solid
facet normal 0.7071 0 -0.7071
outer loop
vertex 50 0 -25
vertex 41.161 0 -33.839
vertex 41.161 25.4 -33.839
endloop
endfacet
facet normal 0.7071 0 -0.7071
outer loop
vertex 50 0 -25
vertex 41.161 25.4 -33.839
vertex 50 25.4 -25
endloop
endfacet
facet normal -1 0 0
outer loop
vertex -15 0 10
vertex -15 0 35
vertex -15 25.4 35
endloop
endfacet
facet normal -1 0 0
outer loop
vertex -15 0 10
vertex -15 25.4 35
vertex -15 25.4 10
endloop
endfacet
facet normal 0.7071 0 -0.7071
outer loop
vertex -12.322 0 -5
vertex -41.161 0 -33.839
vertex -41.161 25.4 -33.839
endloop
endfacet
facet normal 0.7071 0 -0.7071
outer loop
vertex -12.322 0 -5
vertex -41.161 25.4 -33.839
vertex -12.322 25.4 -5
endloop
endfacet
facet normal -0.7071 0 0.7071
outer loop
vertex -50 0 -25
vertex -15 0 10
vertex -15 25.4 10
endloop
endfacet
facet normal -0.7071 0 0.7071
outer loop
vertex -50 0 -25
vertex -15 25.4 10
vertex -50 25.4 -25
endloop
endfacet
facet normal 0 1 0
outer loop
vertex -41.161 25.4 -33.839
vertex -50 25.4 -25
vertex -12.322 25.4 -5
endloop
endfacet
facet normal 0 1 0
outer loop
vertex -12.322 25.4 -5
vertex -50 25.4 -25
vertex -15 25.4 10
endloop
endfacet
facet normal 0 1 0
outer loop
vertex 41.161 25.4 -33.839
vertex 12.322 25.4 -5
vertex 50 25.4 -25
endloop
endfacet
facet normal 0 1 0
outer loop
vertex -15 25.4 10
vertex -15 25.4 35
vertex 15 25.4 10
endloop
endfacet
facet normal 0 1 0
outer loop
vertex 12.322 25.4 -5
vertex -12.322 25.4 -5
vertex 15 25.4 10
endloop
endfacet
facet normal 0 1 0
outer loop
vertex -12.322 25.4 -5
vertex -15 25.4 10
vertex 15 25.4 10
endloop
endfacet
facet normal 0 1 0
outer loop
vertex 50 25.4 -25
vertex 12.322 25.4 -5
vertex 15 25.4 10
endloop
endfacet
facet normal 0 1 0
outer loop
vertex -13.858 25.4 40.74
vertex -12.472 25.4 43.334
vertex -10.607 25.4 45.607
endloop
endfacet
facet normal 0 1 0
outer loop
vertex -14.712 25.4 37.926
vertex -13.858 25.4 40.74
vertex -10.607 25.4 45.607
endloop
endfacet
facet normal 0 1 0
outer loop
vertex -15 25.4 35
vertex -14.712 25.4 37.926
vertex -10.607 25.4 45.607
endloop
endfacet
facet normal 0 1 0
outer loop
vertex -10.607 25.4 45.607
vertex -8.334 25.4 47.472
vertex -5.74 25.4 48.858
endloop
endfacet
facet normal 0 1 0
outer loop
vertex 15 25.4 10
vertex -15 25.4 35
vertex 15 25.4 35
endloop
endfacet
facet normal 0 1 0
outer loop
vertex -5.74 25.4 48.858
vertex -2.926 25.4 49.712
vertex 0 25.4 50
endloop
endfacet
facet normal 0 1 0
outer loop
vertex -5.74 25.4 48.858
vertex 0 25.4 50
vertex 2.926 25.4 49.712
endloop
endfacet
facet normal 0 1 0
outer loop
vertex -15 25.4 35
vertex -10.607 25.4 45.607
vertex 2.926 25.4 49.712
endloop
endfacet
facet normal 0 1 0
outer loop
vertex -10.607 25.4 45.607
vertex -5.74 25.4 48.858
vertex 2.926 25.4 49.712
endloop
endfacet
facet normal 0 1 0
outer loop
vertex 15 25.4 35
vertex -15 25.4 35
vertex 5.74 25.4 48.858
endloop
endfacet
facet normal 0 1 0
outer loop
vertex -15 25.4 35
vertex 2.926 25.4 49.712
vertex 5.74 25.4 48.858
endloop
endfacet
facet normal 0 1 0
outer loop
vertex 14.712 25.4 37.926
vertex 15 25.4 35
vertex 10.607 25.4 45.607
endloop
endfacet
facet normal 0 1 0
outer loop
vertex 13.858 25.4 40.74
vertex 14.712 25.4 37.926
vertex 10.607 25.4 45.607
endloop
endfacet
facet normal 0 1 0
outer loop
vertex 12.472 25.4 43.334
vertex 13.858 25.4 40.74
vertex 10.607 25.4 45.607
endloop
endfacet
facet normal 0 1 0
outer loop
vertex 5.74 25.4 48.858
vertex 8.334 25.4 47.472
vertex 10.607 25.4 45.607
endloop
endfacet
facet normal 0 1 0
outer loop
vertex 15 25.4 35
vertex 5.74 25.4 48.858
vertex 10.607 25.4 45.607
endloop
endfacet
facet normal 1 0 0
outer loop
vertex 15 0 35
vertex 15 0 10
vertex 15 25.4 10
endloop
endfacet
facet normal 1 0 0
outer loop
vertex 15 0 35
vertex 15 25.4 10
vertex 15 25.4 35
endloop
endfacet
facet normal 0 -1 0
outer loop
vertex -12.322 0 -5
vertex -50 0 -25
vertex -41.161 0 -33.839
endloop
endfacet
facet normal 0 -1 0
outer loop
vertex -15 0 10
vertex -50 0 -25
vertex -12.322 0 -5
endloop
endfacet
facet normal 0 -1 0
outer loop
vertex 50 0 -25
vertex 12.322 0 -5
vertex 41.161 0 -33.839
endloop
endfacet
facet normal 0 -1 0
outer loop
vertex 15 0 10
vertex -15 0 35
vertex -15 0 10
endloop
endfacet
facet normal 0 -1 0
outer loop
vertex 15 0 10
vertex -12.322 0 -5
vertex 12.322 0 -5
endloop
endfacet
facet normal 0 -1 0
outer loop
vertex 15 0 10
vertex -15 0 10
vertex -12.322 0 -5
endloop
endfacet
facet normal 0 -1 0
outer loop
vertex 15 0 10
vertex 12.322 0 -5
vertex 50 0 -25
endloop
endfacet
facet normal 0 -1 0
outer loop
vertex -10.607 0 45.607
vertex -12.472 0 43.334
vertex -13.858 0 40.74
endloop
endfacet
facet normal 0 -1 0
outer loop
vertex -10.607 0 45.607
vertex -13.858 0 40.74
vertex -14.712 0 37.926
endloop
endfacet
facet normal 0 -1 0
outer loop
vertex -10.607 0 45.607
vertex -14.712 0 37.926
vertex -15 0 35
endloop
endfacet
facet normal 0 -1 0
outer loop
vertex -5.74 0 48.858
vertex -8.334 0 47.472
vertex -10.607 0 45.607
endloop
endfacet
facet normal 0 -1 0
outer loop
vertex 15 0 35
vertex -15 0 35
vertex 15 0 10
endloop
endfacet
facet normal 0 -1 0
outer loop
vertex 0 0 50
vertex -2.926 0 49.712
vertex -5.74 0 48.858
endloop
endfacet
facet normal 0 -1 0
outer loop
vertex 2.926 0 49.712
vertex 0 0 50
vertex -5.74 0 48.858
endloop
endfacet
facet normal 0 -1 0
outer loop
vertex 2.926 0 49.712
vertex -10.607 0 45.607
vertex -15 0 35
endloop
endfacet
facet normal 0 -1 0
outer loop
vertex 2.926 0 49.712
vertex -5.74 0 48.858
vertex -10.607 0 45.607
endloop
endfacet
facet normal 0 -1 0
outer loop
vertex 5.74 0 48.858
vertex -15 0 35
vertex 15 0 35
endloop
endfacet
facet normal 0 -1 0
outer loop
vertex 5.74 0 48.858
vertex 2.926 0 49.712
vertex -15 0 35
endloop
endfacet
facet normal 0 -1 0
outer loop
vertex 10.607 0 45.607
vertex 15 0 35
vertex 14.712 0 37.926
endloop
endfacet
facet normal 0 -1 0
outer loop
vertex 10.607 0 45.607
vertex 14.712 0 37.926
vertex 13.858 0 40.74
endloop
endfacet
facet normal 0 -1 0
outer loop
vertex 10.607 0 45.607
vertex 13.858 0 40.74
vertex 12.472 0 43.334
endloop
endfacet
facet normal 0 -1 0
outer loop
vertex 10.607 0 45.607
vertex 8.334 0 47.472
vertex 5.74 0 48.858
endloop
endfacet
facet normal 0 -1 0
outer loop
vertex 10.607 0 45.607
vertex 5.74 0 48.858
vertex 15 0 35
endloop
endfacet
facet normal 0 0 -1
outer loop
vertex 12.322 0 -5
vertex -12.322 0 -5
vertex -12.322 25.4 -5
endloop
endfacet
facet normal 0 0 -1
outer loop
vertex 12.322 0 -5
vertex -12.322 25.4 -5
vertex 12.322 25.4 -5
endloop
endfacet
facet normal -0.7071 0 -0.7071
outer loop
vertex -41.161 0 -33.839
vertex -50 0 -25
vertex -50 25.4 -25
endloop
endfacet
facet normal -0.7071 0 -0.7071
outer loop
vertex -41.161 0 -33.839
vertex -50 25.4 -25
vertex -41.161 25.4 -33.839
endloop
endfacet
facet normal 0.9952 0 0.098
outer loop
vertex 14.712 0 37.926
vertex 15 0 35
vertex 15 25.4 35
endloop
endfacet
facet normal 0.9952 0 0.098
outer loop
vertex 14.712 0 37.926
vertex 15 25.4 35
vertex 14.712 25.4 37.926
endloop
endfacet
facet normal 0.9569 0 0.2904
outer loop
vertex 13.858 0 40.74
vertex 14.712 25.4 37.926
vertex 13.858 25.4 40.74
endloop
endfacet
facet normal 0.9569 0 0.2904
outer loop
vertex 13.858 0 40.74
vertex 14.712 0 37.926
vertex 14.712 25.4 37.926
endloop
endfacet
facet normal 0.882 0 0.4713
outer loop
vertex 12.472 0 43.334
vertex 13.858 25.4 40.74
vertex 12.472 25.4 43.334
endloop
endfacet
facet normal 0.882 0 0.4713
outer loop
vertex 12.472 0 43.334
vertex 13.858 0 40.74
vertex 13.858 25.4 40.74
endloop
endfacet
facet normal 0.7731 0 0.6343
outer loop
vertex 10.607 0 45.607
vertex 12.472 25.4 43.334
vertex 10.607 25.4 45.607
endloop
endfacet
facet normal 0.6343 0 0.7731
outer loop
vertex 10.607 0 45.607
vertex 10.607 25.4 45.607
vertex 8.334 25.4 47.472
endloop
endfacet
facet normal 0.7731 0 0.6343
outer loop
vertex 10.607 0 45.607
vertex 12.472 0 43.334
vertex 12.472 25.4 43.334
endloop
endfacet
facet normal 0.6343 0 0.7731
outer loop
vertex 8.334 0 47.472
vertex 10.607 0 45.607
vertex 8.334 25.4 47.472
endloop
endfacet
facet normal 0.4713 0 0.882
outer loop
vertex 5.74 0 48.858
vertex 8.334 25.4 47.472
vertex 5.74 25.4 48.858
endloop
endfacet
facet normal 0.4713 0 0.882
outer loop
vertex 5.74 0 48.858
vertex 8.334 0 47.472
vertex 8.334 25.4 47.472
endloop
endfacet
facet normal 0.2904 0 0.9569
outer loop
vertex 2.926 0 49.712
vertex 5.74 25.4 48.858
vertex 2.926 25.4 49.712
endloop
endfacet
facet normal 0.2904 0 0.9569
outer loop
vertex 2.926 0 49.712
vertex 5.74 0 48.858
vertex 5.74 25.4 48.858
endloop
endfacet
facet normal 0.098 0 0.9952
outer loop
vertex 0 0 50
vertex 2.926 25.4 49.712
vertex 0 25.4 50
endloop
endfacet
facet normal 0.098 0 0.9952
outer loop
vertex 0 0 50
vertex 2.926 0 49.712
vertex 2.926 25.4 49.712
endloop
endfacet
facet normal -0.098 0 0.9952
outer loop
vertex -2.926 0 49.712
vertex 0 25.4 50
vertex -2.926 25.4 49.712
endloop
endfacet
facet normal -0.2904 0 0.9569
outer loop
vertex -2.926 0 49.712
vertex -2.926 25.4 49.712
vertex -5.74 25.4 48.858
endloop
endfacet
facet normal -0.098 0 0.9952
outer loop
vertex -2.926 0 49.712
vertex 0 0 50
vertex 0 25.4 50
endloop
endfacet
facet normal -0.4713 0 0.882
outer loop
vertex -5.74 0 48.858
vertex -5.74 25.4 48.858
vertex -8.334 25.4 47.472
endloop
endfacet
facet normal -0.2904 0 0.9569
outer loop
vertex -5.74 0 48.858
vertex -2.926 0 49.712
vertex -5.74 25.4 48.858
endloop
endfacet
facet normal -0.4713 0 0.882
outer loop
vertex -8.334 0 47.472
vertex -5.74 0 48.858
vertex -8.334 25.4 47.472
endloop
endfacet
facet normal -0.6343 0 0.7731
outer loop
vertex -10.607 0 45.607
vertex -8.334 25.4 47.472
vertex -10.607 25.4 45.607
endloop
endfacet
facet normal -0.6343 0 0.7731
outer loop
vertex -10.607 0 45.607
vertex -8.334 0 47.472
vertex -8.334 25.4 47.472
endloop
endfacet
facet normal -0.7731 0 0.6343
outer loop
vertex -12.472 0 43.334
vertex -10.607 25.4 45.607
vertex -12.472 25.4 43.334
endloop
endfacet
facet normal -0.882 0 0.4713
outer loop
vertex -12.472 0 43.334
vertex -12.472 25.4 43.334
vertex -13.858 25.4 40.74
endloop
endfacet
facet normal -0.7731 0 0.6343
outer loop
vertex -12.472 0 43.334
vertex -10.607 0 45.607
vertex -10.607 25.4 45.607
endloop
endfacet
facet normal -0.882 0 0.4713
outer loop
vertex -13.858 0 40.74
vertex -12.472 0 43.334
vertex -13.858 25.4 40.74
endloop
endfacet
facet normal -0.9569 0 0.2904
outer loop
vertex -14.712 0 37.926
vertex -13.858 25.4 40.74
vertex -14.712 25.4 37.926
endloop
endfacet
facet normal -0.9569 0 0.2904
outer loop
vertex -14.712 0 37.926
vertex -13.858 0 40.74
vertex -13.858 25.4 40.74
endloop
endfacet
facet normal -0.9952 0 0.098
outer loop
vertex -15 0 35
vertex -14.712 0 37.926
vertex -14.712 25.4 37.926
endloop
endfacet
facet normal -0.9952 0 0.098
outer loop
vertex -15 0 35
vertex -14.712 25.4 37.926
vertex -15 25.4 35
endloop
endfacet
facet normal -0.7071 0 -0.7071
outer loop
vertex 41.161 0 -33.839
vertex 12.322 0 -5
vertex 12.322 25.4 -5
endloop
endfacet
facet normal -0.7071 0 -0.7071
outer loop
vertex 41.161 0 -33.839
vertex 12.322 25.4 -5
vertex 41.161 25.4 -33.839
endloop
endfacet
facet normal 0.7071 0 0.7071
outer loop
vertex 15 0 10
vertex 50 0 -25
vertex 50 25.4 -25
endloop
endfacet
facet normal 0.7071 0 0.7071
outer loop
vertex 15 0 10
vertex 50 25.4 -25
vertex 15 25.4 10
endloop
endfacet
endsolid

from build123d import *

# Parameters (mm, degrees)
F0_R     = 12.5
F1_DEPTH = 25.4


with BuildPart() as f1:
    # F0 (on Front) → F1 (new body)
    with BuildSketch(Plane.XZ):
        with BuildLine():
            Line((15, 10), (15, 35))
            ThreePointArc((15, 35), (0, 50), (-15, 35))
            Line((-15, 35), (-15, 10))
            Line((-15, 10), (-50, -25))
            Line((-50, -25), (-41.1611652352, -33.8388347648))
            Line((-41.1611652352, -33.8388347648), (-12.3223304703, -5))
            Line((-12.3223304703, -5), (0, -5))
            Line((0, -5), (12.3223304703, -5))
            Line((12.3223304703, -5), (41.1611652352, -33.8388347648))
            Line((41.1611652352, -33.8388347648), (50, -25))
            Line((50, -25), (15, 10))
        make_face()
        with Locations((0, 35)):
            Circle(F0_R, mode=Mode.SUBTRACT)
        with Locations((0, 35)):
            Circle(F0_R)
    extrude(amount=-F1_DEPTH)


solid = f1.part
